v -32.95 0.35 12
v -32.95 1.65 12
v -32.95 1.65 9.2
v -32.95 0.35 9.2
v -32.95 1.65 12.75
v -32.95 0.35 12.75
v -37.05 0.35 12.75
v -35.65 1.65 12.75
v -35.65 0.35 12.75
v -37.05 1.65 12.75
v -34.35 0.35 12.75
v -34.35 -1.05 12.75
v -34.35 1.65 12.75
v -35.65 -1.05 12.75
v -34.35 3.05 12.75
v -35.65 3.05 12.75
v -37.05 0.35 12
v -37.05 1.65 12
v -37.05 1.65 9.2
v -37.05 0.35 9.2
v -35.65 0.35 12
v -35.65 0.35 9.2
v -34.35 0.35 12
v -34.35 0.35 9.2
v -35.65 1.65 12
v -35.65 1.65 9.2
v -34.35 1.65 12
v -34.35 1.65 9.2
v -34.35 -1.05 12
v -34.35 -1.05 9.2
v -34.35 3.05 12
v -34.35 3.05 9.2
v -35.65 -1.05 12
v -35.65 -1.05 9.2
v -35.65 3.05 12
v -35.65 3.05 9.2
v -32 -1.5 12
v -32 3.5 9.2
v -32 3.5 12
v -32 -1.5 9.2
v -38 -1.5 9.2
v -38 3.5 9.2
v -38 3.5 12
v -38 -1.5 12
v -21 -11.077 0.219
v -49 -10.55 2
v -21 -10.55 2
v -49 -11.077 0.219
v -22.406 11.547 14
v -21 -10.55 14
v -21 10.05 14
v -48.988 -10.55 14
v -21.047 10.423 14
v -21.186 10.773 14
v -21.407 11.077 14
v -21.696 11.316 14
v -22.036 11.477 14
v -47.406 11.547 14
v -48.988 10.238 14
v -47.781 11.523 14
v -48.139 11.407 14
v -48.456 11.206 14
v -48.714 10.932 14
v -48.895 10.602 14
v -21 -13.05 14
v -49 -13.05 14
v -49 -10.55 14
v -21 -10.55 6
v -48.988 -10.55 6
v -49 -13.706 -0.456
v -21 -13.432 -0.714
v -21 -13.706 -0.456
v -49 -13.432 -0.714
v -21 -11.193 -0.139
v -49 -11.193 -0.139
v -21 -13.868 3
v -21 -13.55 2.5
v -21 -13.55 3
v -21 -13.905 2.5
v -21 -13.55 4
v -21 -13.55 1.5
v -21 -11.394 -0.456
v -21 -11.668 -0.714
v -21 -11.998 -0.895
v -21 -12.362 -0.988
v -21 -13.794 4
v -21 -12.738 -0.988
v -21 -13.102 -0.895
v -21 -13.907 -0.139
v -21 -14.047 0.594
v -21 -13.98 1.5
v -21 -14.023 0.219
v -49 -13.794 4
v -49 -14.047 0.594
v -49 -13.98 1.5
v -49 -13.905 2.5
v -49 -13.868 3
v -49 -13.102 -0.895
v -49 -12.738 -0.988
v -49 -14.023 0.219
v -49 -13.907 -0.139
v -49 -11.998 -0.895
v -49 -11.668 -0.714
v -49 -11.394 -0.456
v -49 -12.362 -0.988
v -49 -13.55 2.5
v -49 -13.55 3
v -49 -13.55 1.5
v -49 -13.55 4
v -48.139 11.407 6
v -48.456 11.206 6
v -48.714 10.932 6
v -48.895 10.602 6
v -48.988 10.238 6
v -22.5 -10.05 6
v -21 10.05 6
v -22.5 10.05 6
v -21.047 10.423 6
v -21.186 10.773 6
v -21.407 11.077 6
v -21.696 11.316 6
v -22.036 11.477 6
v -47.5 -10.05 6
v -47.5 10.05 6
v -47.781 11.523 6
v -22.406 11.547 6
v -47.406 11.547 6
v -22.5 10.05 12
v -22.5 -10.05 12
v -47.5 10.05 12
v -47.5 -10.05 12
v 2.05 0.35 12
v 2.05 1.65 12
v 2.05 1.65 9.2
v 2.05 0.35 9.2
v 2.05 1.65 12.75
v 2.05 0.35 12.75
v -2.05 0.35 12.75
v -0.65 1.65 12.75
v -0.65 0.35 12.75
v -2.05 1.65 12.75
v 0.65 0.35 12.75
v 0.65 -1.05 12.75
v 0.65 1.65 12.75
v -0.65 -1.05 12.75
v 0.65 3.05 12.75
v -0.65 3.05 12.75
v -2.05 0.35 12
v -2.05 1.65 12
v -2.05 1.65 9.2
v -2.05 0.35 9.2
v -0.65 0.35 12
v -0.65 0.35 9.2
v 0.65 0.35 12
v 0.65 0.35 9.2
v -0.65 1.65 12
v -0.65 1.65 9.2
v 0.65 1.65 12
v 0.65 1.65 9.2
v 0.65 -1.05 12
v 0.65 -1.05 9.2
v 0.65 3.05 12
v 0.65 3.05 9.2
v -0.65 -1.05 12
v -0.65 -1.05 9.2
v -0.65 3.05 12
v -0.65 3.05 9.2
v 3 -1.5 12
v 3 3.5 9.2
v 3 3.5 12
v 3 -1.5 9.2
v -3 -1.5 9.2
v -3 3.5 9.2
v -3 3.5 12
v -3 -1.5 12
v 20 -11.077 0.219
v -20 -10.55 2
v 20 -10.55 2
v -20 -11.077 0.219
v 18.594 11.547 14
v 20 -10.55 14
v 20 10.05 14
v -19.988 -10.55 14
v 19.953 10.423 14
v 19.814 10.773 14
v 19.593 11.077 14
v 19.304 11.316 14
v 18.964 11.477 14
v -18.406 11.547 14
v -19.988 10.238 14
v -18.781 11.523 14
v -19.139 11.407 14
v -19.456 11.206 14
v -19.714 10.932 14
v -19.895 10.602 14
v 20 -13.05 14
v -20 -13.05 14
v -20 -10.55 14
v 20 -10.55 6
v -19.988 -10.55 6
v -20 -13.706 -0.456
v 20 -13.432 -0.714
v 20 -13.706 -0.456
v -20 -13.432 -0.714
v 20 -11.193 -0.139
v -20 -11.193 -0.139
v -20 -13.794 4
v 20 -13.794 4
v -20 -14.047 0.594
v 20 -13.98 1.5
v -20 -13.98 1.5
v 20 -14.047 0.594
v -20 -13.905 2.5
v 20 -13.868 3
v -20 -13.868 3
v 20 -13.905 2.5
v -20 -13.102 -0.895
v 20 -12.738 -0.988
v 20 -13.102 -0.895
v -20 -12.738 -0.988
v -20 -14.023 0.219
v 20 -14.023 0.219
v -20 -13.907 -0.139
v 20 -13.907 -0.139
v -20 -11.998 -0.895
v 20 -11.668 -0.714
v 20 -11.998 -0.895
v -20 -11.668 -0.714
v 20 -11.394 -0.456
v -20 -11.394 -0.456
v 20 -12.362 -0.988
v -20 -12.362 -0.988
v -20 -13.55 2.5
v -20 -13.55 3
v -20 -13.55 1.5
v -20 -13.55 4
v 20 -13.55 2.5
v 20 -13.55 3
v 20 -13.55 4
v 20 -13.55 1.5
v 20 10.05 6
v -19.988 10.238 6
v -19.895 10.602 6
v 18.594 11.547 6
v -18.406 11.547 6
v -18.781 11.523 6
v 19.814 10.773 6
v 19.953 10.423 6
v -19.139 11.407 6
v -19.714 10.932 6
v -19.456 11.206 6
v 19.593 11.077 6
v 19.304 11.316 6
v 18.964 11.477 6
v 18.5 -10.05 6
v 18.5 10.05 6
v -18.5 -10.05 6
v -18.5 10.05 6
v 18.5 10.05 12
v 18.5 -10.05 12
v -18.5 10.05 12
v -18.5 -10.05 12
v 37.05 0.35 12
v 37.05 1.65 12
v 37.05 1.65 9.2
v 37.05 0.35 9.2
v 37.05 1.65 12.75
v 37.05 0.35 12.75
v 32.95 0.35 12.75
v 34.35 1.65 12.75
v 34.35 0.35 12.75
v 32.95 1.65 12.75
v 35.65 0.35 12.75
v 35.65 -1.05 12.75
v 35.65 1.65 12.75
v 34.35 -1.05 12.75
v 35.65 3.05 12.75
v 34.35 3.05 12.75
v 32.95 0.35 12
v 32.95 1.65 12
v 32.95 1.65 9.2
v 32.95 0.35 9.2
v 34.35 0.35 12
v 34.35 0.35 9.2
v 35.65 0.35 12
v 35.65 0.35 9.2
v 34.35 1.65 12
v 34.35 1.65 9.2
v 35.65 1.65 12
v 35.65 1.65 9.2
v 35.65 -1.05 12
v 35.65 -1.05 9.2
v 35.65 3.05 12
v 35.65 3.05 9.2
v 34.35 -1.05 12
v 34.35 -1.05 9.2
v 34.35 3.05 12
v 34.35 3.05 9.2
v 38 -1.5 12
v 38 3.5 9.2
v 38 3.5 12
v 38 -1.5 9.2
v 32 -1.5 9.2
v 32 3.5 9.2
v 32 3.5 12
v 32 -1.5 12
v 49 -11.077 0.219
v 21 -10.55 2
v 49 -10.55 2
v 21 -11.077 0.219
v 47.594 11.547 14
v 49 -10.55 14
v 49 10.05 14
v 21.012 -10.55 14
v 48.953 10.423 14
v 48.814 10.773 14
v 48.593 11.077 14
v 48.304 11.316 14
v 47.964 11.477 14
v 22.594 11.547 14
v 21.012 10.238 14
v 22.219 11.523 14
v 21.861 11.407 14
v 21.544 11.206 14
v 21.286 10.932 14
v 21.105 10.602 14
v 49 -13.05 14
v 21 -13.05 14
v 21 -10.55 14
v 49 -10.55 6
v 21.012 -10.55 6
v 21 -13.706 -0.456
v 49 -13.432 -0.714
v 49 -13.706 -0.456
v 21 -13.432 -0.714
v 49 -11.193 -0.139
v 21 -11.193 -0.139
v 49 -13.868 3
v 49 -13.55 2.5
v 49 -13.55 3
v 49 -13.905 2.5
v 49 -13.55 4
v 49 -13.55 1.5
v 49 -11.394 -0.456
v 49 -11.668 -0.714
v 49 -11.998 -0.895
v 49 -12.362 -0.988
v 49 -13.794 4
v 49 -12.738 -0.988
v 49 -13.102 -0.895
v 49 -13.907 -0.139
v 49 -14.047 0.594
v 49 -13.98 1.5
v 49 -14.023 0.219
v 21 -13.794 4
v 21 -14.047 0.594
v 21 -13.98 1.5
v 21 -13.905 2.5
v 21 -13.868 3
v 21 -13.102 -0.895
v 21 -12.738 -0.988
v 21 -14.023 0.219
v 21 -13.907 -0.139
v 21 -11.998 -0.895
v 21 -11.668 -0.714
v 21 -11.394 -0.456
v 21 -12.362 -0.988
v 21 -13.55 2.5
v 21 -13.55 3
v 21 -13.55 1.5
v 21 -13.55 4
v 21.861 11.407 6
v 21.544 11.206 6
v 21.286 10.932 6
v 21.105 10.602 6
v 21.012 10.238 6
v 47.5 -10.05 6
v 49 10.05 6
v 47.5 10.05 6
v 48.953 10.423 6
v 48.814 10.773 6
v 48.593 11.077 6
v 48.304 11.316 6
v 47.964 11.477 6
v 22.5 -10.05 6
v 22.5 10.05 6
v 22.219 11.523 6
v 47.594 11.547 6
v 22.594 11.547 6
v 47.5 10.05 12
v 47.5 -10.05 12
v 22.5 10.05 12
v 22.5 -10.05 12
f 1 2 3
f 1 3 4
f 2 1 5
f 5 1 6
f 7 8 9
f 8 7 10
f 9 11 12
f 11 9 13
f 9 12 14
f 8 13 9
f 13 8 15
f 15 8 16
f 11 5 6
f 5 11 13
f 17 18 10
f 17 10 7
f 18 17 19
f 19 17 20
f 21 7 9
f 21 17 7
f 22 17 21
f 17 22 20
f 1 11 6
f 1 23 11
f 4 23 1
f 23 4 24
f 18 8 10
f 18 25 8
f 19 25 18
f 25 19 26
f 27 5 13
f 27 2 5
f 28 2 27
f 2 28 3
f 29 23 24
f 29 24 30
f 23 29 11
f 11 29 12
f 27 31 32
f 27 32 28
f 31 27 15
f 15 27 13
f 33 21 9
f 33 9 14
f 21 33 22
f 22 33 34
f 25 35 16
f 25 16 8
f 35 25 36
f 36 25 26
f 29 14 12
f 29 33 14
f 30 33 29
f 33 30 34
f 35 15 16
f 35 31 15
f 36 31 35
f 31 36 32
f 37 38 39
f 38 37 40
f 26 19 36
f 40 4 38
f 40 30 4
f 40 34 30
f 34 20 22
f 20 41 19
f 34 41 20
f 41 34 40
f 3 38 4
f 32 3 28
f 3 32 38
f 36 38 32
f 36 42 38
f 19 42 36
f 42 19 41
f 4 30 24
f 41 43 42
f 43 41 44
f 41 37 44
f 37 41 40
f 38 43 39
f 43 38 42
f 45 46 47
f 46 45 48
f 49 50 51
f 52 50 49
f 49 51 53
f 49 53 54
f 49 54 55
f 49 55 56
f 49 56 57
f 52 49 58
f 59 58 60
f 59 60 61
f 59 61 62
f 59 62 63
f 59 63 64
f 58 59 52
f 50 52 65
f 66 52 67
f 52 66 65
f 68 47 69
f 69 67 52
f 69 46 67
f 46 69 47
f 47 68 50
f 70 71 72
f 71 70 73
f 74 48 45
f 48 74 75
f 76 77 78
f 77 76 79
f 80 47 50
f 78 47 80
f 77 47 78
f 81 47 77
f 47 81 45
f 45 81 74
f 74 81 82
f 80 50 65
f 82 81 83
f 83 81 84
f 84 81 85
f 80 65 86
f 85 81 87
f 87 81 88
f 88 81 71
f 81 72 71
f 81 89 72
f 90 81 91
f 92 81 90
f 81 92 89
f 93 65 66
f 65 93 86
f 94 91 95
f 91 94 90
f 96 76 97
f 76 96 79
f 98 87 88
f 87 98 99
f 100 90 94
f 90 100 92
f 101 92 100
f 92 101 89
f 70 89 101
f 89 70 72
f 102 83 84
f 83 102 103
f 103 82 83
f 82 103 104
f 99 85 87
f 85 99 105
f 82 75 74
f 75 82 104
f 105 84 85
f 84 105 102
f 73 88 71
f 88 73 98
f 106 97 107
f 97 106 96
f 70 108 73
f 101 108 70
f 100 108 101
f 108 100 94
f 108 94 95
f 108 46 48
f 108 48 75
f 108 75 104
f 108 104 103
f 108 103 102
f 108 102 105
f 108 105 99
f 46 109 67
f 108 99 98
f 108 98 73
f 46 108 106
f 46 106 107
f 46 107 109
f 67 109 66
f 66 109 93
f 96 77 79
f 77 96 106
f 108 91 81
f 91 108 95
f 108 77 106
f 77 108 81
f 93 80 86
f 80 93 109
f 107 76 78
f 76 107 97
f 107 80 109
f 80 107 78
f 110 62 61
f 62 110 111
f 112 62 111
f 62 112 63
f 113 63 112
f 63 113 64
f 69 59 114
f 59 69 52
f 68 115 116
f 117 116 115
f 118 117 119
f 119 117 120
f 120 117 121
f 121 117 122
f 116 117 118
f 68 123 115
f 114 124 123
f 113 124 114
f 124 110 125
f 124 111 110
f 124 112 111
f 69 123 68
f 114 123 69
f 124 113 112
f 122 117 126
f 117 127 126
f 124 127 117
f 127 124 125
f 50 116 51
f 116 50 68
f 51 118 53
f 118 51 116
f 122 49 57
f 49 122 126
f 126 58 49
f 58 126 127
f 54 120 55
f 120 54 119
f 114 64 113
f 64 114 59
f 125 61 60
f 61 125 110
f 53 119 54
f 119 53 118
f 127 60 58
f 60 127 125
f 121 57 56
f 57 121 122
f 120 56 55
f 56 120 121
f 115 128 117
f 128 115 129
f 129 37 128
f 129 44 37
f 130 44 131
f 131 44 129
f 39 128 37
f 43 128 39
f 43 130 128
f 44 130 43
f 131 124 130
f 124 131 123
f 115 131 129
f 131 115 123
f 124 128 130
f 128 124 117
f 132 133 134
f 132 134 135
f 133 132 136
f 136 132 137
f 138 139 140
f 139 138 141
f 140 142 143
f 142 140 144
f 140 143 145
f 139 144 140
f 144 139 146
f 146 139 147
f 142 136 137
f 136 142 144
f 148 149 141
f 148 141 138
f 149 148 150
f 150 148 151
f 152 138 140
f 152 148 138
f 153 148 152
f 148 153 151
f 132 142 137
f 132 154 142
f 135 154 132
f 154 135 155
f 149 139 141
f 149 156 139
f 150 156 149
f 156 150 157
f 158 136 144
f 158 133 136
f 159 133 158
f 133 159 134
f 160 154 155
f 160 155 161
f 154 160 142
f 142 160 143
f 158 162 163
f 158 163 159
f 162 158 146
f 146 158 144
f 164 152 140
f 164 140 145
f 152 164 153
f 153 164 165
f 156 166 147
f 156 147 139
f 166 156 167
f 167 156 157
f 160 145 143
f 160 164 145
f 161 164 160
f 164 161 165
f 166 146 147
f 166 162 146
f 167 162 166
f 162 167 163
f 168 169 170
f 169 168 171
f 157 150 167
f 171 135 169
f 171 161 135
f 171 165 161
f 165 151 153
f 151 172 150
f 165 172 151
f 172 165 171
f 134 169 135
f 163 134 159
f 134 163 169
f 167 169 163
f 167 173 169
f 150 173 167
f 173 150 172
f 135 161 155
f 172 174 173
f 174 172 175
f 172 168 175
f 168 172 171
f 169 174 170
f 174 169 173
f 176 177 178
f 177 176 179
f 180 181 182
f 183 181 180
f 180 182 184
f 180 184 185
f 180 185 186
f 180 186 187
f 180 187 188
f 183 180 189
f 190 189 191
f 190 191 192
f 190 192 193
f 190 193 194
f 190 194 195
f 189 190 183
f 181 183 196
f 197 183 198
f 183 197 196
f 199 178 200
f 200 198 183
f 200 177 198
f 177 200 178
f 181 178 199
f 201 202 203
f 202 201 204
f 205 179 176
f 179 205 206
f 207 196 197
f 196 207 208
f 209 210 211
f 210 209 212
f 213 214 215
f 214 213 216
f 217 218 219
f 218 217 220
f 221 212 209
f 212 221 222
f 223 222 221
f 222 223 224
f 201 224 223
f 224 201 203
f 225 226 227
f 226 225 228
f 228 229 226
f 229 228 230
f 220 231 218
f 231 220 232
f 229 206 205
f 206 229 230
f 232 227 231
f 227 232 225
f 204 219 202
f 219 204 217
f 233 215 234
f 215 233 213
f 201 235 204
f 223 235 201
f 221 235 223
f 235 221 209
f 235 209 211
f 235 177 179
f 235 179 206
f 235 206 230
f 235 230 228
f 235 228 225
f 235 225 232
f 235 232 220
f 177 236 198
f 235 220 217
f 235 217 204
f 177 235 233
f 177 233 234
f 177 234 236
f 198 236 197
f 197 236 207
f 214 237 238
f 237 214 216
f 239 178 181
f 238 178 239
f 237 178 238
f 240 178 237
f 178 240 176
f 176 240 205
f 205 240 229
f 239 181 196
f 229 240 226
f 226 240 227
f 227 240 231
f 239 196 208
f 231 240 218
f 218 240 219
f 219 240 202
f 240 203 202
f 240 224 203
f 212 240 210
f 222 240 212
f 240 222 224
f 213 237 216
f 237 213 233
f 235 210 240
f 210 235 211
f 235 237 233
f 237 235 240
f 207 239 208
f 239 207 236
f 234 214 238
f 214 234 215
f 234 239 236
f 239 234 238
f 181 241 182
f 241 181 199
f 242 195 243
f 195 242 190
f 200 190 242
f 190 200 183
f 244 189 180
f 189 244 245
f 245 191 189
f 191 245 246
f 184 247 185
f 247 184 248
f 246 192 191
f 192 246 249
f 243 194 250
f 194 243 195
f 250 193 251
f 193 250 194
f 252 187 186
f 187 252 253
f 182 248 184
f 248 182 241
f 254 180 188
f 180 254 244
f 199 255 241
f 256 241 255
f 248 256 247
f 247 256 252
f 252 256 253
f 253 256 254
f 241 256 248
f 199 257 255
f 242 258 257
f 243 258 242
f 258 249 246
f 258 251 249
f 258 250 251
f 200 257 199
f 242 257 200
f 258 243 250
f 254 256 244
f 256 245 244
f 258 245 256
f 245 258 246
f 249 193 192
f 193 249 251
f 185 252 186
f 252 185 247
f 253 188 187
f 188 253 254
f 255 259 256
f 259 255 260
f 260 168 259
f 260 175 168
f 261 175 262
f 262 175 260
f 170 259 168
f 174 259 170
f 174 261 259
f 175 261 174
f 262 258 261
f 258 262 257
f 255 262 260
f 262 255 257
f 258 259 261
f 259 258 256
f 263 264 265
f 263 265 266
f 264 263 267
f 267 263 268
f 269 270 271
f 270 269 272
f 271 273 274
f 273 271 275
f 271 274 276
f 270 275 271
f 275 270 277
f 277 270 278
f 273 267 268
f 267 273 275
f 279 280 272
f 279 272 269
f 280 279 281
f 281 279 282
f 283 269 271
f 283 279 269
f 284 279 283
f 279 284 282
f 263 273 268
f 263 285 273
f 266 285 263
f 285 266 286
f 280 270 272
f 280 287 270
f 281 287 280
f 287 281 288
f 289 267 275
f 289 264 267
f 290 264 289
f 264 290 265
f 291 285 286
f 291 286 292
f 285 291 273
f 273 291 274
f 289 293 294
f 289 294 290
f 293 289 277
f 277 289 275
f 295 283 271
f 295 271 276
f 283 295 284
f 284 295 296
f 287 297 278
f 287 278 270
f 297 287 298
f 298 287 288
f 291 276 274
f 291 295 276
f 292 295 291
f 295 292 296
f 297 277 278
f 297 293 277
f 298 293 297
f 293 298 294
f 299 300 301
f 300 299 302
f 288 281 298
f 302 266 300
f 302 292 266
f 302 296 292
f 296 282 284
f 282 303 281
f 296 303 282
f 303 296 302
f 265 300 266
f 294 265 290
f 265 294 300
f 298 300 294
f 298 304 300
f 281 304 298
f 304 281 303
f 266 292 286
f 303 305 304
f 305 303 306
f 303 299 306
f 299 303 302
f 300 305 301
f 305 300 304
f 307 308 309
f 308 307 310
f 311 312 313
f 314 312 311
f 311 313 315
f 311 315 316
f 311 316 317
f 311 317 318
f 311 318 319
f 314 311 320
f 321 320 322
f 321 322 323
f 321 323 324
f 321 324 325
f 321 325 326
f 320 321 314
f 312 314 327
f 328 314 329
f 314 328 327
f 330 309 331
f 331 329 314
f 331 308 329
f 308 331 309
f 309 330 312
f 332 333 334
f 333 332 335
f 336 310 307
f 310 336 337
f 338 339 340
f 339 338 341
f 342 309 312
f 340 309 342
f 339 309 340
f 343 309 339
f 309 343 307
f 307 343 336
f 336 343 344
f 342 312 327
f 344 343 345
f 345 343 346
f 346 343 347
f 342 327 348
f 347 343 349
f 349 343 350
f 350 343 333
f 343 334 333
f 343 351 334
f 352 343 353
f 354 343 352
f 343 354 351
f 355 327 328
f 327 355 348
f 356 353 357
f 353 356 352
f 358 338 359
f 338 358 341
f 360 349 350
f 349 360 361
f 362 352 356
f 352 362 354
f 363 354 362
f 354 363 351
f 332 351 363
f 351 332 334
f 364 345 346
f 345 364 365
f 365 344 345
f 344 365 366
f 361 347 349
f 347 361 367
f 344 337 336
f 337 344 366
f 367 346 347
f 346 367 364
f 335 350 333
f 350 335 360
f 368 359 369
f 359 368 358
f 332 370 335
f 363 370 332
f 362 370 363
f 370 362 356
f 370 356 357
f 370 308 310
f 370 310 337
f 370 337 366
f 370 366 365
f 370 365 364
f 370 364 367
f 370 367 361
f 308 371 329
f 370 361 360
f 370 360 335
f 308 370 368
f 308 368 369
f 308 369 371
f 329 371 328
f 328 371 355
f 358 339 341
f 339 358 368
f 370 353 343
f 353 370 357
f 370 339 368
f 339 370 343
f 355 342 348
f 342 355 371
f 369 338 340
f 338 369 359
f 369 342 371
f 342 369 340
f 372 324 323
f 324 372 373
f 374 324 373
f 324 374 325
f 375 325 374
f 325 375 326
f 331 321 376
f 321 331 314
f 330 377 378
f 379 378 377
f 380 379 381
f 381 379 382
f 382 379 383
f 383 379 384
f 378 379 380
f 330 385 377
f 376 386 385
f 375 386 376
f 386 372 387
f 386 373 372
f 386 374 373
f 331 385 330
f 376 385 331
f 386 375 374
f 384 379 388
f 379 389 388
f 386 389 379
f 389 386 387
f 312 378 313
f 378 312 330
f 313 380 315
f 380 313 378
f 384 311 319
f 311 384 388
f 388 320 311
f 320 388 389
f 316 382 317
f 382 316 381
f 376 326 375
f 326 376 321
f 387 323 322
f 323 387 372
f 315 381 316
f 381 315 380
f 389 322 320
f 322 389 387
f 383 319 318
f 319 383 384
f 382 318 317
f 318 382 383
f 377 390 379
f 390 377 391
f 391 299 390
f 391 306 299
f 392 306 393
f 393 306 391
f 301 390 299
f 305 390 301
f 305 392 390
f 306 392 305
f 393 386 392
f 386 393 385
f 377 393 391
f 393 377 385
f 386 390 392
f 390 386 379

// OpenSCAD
/*
 * Parametryczny moduł Keycapa dla przełącznika typu MX.
 */

// Ustawienie domyślnej rozdzielczości
$fn = 50;

/**
 * Generuje pojedynczy keycap dla przełącznika MX.
 *
 * @param u_size Całkowita szerokość i głębokość keycapa (np. 18mm dla 1U)
 * @param height Całkowita wysokość keycapa
 * @param top_offset Wartość zmniejszająca górną powierzchnię (tworzy skośne boki)
 * @param corner_radius Promień zaokrąglenia narożników górnej powierzchni
 * @param stem_height Wysokość wewnętrznego trzpienia MX
 * @param stem_tol Tolerancja dla krzyżowego trzpienia MX (kluczowy wymiar dla pasowania)
 */
module mx_keycap(u_size = 23.1, height = 8, top_offset = 1.5, corner_radius = 1.5, stem_height = 4.5, stem_tol = 0.1) {
    
    // --- Definicje wymiarów MX Stem (Standardowe) ---
    // Krzyżowy trzpień MX ma boki ok. 3.9mm, a 'puste' przestrzenie ok. 1.2mm
    // Wymaga to precyzyjnego modelowania przestrzeni negatywnej.
    
    stem_arm_width = 1.2 + stem_tol;  // Szerokość "ramion" krzyża (przestrzeń negatywna)
    stem_total_length = 4.0 + stem_tol; // Całkowita długość krzyża
    
    difference() {
        translate([0, 0, 3]) cube([6, 5, 3.6], center = true);
        
        translate([0, 0, 3.5+2]) { // Pozycjonujemy stem na dole keycapa
            union() {
                // Poziome ramiona krzyża
                cube([stem_total_length, stem_arm_width, stem_height + 4], center = true);
                // Pionowe ramiona krzyża
                cube([stem_arm_width, stem_total_length, stem_height + 4], center = true);
            }
        }
    }
    
    // --- Główna bryła keycapa ---
    difference() {
        // 1. Podstawowa bryła keycapa
        // Używamy minkowski sumy dla zaokrąglonych krawędzi (opcjonalnie)
        // LUB po prostu cube z zaokrąglonymi narożnikami
        
        // Bryła pozytywna (zaokrąglony sześcian)
        // Używamy cylinder_fn = $fn/2 dla lepszego renderowania zaokrągleń
        hull() {
            translate([-(u_size/2 - corner_radius), -(u_size/2 - corner_radius), 0])
            cylinder(r = corner_radius, h = height, $fn = $fn/2);

            translate([(u_size/2 - corner_radius), -(u_size/2 - corner_radius), 0])
            cylinder(r = corner_radius, h = height, $fn = $fn/2);

            translate([-(u_size/2 - corner_radius), (u_size/2 - corner_radius), 0])
            cylinder(r = corner_radius, h = height, $fn = $fn/2);

            translate([(u_size/2 - corner_radius), (u_size/2 - corner_radius), 0])
            cylinder(r = corner_radius, h = height, $fn = $fn/2);
        }

        // Dodatkowe wycięcie dla skośnych boków (opcjonalnie)
        // Tworzy lekki "bevel" na górnej krawędzi
        if (top_offset > 0) {
            translate([0, 0, height/2 + 2]) // Lekko podnieść, żeby nie tworzyć artefaktów
            cube([u_size - top_offset * 2, u_size - top_offset * 2, height], center = true);
        }

        // 2. Wycięcie na MX Stem (krzyż)
        // To jest najważniejsza część - odwrotność trzpienia przełącznika
        translate([0, 0, 3.5+2]) { // Pozycjonujemy stem na dole keycapa
            union() {
                // Poziome ramiona krzyża
                cube([stem_total_length, stem_arm_width, stem_height + 4], center = true);
                // Pionowe ramiona krzyża
                cube([stem_arm_width, stem_total_length, stem_height + 4], center = true);
            }
        }
    }
}

module mx_keycap2(u_size = 23.1, y_size = 23.1, height = 8, top_offset = 1.5, corner_radius = 1.5, stem_height = 4.5, stem_tol = 0.1, character="") {
    
    // --- Definicje wymiarów MX Stem (Standardowe) ---
    // Krzyżowy trzpień MX ma boki ok. 3.9mm, a 'puste' przestrzenie ok. 1.2mm
    // Wymaga to precyzyjnego modelowania przestrzeni negatywnej.
    
    stem_arm_width = 1.2 + stem_tol;  // Szerokość "ramion" krzyża (przestrzeń negatywna)
    stem_total_length = 4.0 + stem_tol; // Całkowita długość krzyża
    //translate([0, -1, 0]) cylinder(h=50, r=1, center=true);
    translate([0, -1, 0]) difference() {
        translate([0, 0, 3]) cube([6, 5, 3.6], center = true);
        
        translate([0, 0, 3.5+2]) { // Pozycjonujemy stem na dole keycapa
            union() {
                // Poziome ramiona krzyża
                cube([stem_total_length, stem_arm_width, stem_height + 4], center = true);
                // Pionowe ramiona krzyża
                cube([stem_arm_width, stem_total_length, stem_height + 4], center = true);
            }
        }
    }
    
    // --- Główna bryła keycapa ---
    difference() {
        // 1. Podstawowa bryła keycapa
        // Używamy minkowski sumy dla zaokrąglonych krawędzi (opcjonalnie)
        // LUB po prostu cube z zaokrąglonymi narożnikami
        
        // Bryła pozytywna (zaokrąglony sześcian)
        // Używamy cylinder_fn = $fn/2 dla lepszego renderowania zaokrągleń
        union() {
            hull() {
                translate([-(u_size/2 - corner_radius), -(y_size/2 - corner_radius), 0])
                cylinder(r = corner_radius, h = height, $fn = $fn/2);

                translate([(u_size/2 - corner_radius), -(y_size/2 - corner_radius), 0])
                cylinder(r = corner_radius, h = height, $fn = $fn/2);

                translate([-(u_size/2 - corner_radius), (y_size/2 - corner_radius) + 0.5, 0])
                cylinder(r = corner_radius, h = height, $fn = $fn/2);

                translate([(u_size/2 - corner_radius), (y_size/2 - corner_radius) + 0.5, 0])
                cylinder(r = corner_radius, h = height, $fn = $fn/2);
            };
            
            
            translate([u_size / -2, y_size / 2, corner_radius]) 
                rotate([0, 90, 0]) {
                    difference() {
                        hull() {
                            translate([-10.5,-1,0]) cube([12, corner_radius+1, u_size]);
                            
//                            cylinder(r = corner_radius, h = u_size, $fn = $fn/2);
                        
                            translate([-12,1,0]) cylinder(r = corner_radius, h = u_size, $fn = $fn/2);
                        }
                        translate([-11,2,0]) cube([1, 1, u_size+1]);
                        translate([-9.5,2,0]) cube([1, 1, u_size+1]);
                    }
                }
                
        }
            //translate([0, 0, 0.2]) rotate([180, 0, 0]) linear_extrude(height = 0.2) text( character, size=6, valign="center", halign="center", font="Symbola:style=Bold");
        
        // Dodatkowe wycięcie dla skośnych boków (opcjonalnie)
        // Tworzy lekki "bevel" na górnej krawędzi
        if (top_offset > 0) {
            translate([0, 0, height/2 + 2]) // Lekko podnieść, żeby nie tworzyć artefaktów
            cube([u_size - top_offset * 2, y_size - top_offset * 2, height], center = true);
        }

        // 2. Wycięcie na MX Stem (krzyż)
        // To jest najważniejsza część - odwrotność trzpienia przełącznika
        translate([0, -1, 3.5+2]) { // Pozycjonujemy stem na dole keycapa
            union() {
                // Poziome ramiona krzyża
                cube([stem_total_length, stem_arm_width, stem_height + 4], center = true);
                // Pionowe ramiona krzyża
                cube([stem_arm_width, stem_total_length, stem_height + 4], center = true);
            }
        }
    }
            //color("red") translate([0, 0, 0.2]) rotate([180, 0, 0]) linear_extrude(height = 0.2) text( character, size=6, valign="center", halign="center", font="Symbola:style=Bold");
}

base_width = 104.4;

translate([0, 0, 14]) rotate([180,0,0]) {
    translate([-35,0,0]) mx_keycap2(u_size = 28, character = "PLAY");
    translate([0,0,0]) mx_keycap2(u_size = 40, character = "NEXT");
    translate([35,0,0]) mx_keycap2(u_size = 28, character = "LIKE");
};
// Keycap z większym zaokrągleniem i mniejszą tolerancją stemu
// translate([25,0,0])
// mx_keycap(corner_radius = 2.5, stem_tol = 0.05);

// Keycap 2U (np. Shift) - wymaga dostosowania u_size
// translate([50,0,0])
// mx_keycap(u_size = 37.05, stem_tol = 0.08); // 37.05 = 2 * 19.05 - 1.05 (między klawiszami)
